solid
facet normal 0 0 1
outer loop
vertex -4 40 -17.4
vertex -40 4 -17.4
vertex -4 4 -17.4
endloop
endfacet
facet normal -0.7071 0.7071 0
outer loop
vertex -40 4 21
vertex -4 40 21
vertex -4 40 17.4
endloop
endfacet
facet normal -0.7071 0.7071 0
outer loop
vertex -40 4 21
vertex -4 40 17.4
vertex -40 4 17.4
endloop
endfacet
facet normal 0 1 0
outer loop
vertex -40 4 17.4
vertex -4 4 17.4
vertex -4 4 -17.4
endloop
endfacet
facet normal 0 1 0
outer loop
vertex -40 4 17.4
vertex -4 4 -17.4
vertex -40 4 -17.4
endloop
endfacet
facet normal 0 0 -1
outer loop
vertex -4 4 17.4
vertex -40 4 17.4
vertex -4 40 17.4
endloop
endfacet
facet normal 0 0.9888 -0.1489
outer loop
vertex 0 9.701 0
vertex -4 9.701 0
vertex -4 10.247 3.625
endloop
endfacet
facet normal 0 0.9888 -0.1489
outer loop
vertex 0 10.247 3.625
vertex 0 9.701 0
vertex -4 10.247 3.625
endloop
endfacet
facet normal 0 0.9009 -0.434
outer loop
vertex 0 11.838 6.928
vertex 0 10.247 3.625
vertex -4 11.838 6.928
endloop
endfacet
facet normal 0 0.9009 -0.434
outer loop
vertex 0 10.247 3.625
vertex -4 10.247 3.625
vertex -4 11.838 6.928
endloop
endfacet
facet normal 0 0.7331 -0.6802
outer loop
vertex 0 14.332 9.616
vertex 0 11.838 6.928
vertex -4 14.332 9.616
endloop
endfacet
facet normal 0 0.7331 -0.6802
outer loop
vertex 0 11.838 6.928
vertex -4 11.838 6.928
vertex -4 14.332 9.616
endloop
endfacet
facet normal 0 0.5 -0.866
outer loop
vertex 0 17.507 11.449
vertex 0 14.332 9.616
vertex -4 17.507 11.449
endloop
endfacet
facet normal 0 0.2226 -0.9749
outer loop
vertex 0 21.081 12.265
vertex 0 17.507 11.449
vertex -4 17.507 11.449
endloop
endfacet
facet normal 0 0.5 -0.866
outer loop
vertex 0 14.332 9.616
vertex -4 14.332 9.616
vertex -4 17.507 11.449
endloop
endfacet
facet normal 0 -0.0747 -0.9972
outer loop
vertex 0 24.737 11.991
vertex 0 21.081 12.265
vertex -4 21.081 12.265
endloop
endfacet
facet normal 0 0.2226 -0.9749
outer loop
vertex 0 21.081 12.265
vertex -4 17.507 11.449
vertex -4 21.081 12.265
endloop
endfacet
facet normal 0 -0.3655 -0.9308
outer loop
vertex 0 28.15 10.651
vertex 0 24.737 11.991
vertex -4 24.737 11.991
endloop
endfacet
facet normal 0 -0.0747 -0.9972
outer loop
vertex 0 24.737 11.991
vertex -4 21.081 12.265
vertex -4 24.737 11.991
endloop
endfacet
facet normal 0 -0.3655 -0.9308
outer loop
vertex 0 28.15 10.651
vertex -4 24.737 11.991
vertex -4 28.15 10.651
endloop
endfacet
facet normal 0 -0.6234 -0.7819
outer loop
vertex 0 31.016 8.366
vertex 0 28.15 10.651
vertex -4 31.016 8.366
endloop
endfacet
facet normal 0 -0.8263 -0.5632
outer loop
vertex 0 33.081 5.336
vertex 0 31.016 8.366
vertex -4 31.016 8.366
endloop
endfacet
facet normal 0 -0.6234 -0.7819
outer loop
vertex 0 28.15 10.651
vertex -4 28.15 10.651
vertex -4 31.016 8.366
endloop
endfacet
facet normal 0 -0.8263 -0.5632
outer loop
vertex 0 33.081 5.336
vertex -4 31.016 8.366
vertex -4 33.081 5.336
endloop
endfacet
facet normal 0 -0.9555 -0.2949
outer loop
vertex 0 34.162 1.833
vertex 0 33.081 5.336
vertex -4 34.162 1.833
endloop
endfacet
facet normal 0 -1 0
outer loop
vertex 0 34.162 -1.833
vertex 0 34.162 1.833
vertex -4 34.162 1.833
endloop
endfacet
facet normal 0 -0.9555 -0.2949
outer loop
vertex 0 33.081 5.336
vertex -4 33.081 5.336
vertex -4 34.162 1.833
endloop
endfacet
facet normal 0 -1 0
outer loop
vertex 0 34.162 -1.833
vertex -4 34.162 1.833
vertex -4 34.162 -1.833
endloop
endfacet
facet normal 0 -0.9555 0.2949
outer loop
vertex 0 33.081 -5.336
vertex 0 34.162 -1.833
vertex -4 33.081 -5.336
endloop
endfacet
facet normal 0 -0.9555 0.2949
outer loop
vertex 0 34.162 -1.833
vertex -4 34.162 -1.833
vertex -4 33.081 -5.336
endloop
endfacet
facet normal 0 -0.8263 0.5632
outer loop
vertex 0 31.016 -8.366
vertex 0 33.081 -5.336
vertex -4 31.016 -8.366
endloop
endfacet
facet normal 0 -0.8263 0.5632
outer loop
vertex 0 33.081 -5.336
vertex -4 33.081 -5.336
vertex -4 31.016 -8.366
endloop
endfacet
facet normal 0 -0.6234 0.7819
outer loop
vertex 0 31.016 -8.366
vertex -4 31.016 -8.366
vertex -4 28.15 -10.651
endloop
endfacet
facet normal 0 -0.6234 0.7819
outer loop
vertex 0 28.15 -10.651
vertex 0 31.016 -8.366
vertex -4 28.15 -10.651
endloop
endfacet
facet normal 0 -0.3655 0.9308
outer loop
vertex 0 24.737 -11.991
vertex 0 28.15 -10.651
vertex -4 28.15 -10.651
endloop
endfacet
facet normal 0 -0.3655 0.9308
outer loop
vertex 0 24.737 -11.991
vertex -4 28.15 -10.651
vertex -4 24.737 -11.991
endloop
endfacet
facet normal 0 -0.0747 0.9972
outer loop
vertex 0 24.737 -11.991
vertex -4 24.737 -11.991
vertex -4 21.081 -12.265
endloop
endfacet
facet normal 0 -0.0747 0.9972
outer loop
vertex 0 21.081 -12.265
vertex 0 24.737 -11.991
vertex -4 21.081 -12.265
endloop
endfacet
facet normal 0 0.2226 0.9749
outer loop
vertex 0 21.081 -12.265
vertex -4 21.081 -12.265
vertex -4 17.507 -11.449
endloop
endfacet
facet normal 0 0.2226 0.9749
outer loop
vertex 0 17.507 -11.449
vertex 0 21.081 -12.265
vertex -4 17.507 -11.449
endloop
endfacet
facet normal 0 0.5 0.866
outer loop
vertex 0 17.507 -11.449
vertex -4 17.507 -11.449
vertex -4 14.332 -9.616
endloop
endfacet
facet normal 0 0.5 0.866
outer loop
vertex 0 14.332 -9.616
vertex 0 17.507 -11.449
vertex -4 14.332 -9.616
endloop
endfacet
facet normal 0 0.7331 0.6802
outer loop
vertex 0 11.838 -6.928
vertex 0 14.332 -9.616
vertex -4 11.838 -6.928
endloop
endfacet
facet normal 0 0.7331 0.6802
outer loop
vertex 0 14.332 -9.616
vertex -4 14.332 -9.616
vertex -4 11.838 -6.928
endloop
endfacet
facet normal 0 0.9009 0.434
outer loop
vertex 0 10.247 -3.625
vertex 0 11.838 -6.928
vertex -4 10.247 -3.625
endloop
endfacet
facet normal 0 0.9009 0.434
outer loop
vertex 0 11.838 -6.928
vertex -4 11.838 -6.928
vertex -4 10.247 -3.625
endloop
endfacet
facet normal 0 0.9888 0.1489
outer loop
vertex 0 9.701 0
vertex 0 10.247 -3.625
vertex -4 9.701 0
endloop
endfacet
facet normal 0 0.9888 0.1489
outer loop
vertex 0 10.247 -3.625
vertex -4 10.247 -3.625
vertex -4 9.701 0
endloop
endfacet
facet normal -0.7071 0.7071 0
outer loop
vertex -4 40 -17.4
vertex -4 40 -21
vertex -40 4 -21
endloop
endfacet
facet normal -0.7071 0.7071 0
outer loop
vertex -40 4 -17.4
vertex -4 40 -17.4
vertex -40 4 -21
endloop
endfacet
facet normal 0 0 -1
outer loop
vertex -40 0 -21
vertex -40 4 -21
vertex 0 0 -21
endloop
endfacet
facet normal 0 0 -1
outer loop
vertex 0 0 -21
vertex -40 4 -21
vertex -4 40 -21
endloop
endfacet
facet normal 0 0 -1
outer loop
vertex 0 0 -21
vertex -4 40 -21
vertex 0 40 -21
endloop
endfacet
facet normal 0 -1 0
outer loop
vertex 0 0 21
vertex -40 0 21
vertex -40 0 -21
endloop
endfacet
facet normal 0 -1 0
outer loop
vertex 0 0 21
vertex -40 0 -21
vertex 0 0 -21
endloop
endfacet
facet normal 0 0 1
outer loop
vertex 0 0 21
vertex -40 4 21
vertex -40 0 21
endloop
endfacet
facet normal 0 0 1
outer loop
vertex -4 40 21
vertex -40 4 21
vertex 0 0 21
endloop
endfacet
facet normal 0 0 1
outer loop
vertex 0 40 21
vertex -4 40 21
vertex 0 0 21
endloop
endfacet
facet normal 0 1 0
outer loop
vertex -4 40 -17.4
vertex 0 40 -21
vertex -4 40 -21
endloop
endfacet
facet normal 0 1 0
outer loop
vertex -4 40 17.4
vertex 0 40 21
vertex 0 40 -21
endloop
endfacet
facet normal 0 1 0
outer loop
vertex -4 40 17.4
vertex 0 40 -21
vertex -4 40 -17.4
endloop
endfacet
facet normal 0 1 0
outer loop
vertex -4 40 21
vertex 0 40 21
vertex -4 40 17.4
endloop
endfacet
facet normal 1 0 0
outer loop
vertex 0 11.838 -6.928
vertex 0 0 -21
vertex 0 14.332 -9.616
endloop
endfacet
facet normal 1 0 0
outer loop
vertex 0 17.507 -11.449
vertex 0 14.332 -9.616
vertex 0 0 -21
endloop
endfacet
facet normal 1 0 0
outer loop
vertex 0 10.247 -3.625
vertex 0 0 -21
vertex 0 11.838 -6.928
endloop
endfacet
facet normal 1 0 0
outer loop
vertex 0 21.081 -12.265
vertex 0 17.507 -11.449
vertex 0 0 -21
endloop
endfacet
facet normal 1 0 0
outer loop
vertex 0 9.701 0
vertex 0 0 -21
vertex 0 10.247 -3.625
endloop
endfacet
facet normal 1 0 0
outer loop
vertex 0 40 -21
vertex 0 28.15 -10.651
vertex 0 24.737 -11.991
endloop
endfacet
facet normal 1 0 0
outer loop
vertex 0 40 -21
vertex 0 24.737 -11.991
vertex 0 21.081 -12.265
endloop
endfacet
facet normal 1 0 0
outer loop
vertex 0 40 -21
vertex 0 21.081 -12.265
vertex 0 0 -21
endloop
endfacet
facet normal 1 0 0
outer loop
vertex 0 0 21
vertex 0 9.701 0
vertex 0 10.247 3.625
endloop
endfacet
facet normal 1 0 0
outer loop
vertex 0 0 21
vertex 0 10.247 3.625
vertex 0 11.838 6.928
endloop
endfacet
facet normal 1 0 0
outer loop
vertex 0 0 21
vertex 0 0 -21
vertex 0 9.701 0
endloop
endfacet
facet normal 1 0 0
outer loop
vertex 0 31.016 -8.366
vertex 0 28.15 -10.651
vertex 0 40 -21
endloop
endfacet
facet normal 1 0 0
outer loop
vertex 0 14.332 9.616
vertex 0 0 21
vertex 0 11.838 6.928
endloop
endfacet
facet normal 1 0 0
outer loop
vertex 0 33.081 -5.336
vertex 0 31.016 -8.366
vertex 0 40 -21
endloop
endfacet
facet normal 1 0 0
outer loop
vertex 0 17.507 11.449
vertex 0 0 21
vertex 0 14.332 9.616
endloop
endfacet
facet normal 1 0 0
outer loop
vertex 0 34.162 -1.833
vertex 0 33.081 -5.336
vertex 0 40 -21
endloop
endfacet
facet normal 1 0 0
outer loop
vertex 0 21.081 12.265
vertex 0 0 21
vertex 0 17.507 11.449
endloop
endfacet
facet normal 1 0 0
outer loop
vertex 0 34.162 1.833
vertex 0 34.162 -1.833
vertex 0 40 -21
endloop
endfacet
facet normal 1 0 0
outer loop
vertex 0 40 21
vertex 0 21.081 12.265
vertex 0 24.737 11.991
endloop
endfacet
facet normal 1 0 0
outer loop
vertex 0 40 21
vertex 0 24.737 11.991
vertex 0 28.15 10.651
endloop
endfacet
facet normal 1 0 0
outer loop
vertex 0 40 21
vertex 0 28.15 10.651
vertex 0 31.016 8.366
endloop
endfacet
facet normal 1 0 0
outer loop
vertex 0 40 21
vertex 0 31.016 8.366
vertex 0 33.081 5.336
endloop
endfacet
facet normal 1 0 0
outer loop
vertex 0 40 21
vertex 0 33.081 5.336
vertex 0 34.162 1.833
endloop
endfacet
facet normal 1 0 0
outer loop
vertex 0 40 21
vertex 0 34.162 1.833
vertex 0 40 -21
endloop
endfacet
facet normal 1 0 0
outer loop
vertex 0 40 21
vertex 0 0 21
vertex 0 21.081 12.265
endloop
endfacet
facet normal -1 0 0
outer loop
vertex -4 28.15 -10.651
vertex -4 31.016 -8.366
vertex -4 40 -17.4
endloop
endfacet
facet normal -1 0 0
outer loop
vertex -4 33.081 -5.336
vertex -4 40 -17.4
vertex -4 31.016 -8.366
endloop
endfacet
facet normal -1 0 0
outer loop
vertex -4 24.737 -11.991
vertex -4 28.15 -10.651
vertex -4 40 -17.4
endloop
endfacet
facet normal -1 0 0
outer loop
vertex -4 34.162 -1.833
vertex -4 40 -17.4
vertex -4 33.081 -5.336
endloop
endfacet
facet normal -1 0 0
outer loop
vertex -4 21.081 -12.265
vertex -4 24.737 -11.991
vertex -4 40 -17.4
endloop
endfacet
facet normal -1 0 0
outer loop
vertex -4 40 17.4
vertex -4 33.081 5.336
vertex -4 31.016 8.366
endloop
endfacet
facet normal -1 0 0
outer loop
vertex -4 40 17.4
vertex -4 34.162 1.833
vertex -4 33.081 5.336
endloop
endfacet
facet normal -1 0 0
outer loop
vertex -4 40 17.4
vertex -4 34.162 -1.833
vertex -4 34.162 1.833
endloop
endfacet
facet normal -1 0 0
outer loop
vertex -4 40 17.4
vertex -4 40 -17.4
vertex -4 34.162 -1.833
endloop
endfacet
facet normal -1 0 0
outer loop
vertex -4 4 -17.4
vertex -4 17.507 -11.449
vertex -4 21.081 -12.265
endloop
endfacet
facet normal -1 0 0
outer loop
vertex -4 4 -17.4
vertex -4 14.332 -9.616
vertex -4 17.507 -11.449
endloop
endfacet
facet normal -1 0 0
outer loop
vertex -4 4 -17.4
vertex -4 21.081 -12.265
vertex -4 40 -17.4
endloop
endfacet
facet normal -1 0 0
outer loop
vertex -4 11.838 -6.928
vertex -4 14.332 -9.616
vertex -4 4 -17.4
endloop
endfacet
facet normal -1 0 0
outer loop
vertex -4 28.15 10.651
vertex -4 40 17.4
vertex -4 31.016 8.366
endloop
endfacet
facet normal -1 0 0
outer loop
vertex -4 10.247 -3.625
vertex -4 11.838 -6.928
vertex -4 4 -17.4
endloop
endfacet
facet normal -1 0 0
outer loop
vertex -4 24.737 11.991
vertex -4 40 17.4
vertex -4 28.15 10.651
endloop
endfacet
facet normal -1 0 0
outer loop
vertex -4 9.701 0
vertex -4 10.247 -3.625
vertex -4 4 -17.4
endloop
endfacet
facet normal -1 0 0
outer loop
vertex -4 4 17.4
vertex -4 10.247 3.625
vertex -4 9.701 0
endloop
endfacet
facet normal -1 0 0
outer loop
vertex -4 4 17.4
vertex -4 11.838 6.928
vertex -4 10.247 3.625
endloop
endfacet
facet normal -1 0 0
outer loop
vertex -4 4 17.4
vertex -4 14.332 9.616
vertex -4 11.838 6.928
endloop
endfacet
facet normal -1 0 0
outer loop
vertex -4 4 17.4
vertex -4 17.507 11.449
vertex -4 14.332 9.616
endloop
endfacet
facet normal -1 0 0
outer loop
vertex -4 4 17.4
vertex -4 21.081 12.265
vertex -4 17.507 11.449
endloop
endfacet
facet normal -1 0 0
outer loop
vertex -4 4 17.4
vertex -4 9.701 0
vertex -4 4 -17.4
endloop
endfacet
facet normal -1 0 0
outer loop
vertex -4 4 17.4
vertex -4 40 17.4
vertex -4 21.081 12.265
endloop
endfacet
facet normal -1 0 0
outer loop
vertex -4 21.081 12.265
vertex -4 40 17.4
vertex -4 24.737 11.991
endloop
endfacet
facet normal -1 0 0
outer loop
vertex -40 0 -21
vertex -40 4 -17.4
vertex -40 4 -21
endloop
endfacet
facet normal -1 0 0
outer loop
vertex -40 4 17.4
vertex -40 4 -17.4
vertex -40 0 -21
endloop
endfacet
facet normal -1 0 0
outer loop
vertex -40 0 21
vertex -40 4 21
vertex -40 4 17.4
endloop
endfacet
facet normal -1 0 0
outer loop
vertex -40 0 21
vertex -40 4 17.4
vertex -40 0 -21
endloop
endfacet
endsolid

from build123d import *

# Parameters (mm, degrees)
F1_DEPTH = 21
F2_R     = 12.2992849538
F3_DEPTH = 4
F5_DEPTH = 3.6


# Not quite as in the source:
# - a pattern or mirror of a feature is missing from the dataset's text; its kind, count and spacing are read off the source's solid


with BuildPart() as f1:
    # F0 (on Top) → F1 (new body, symmetric)
    with BuildSketch(Plane.XY):
        Polygon((-40, 4), (-40, 0), (0, 0), (0, 40), (-4, 40), (-4, 4), align=None)
    extrude(amount=F1_DEPTH, both=True)

    # F2 (on face) → F3 (cut, through all)
    with BuildSketch(Plane(origin=(-4, 0, 0), x_dir=(0, -1, 0), z_dir=(-1, 0, 0))):
        with Locations((-22, 0)):
            Circle(F2_R)
    extrude(amount=-F3_DEPTH, mode=Mode.SUBTRACT)

    # F4 (on face) → F5 (join)
    with BuildSketch(Plane.XY.offset(21)):
        Polygon((-4, 40), (-40, 4), (-4, 4), align=None)
    f5 = extrude(amount=-F5_DEPTH)

    # F5_copies: F5 across plane
    add(f5.mirror(Plane(origin=(0, 0, 0), x_dir=(-1, 0, 0), z_dir=(0, 0, -1))))


solid = f1.part
